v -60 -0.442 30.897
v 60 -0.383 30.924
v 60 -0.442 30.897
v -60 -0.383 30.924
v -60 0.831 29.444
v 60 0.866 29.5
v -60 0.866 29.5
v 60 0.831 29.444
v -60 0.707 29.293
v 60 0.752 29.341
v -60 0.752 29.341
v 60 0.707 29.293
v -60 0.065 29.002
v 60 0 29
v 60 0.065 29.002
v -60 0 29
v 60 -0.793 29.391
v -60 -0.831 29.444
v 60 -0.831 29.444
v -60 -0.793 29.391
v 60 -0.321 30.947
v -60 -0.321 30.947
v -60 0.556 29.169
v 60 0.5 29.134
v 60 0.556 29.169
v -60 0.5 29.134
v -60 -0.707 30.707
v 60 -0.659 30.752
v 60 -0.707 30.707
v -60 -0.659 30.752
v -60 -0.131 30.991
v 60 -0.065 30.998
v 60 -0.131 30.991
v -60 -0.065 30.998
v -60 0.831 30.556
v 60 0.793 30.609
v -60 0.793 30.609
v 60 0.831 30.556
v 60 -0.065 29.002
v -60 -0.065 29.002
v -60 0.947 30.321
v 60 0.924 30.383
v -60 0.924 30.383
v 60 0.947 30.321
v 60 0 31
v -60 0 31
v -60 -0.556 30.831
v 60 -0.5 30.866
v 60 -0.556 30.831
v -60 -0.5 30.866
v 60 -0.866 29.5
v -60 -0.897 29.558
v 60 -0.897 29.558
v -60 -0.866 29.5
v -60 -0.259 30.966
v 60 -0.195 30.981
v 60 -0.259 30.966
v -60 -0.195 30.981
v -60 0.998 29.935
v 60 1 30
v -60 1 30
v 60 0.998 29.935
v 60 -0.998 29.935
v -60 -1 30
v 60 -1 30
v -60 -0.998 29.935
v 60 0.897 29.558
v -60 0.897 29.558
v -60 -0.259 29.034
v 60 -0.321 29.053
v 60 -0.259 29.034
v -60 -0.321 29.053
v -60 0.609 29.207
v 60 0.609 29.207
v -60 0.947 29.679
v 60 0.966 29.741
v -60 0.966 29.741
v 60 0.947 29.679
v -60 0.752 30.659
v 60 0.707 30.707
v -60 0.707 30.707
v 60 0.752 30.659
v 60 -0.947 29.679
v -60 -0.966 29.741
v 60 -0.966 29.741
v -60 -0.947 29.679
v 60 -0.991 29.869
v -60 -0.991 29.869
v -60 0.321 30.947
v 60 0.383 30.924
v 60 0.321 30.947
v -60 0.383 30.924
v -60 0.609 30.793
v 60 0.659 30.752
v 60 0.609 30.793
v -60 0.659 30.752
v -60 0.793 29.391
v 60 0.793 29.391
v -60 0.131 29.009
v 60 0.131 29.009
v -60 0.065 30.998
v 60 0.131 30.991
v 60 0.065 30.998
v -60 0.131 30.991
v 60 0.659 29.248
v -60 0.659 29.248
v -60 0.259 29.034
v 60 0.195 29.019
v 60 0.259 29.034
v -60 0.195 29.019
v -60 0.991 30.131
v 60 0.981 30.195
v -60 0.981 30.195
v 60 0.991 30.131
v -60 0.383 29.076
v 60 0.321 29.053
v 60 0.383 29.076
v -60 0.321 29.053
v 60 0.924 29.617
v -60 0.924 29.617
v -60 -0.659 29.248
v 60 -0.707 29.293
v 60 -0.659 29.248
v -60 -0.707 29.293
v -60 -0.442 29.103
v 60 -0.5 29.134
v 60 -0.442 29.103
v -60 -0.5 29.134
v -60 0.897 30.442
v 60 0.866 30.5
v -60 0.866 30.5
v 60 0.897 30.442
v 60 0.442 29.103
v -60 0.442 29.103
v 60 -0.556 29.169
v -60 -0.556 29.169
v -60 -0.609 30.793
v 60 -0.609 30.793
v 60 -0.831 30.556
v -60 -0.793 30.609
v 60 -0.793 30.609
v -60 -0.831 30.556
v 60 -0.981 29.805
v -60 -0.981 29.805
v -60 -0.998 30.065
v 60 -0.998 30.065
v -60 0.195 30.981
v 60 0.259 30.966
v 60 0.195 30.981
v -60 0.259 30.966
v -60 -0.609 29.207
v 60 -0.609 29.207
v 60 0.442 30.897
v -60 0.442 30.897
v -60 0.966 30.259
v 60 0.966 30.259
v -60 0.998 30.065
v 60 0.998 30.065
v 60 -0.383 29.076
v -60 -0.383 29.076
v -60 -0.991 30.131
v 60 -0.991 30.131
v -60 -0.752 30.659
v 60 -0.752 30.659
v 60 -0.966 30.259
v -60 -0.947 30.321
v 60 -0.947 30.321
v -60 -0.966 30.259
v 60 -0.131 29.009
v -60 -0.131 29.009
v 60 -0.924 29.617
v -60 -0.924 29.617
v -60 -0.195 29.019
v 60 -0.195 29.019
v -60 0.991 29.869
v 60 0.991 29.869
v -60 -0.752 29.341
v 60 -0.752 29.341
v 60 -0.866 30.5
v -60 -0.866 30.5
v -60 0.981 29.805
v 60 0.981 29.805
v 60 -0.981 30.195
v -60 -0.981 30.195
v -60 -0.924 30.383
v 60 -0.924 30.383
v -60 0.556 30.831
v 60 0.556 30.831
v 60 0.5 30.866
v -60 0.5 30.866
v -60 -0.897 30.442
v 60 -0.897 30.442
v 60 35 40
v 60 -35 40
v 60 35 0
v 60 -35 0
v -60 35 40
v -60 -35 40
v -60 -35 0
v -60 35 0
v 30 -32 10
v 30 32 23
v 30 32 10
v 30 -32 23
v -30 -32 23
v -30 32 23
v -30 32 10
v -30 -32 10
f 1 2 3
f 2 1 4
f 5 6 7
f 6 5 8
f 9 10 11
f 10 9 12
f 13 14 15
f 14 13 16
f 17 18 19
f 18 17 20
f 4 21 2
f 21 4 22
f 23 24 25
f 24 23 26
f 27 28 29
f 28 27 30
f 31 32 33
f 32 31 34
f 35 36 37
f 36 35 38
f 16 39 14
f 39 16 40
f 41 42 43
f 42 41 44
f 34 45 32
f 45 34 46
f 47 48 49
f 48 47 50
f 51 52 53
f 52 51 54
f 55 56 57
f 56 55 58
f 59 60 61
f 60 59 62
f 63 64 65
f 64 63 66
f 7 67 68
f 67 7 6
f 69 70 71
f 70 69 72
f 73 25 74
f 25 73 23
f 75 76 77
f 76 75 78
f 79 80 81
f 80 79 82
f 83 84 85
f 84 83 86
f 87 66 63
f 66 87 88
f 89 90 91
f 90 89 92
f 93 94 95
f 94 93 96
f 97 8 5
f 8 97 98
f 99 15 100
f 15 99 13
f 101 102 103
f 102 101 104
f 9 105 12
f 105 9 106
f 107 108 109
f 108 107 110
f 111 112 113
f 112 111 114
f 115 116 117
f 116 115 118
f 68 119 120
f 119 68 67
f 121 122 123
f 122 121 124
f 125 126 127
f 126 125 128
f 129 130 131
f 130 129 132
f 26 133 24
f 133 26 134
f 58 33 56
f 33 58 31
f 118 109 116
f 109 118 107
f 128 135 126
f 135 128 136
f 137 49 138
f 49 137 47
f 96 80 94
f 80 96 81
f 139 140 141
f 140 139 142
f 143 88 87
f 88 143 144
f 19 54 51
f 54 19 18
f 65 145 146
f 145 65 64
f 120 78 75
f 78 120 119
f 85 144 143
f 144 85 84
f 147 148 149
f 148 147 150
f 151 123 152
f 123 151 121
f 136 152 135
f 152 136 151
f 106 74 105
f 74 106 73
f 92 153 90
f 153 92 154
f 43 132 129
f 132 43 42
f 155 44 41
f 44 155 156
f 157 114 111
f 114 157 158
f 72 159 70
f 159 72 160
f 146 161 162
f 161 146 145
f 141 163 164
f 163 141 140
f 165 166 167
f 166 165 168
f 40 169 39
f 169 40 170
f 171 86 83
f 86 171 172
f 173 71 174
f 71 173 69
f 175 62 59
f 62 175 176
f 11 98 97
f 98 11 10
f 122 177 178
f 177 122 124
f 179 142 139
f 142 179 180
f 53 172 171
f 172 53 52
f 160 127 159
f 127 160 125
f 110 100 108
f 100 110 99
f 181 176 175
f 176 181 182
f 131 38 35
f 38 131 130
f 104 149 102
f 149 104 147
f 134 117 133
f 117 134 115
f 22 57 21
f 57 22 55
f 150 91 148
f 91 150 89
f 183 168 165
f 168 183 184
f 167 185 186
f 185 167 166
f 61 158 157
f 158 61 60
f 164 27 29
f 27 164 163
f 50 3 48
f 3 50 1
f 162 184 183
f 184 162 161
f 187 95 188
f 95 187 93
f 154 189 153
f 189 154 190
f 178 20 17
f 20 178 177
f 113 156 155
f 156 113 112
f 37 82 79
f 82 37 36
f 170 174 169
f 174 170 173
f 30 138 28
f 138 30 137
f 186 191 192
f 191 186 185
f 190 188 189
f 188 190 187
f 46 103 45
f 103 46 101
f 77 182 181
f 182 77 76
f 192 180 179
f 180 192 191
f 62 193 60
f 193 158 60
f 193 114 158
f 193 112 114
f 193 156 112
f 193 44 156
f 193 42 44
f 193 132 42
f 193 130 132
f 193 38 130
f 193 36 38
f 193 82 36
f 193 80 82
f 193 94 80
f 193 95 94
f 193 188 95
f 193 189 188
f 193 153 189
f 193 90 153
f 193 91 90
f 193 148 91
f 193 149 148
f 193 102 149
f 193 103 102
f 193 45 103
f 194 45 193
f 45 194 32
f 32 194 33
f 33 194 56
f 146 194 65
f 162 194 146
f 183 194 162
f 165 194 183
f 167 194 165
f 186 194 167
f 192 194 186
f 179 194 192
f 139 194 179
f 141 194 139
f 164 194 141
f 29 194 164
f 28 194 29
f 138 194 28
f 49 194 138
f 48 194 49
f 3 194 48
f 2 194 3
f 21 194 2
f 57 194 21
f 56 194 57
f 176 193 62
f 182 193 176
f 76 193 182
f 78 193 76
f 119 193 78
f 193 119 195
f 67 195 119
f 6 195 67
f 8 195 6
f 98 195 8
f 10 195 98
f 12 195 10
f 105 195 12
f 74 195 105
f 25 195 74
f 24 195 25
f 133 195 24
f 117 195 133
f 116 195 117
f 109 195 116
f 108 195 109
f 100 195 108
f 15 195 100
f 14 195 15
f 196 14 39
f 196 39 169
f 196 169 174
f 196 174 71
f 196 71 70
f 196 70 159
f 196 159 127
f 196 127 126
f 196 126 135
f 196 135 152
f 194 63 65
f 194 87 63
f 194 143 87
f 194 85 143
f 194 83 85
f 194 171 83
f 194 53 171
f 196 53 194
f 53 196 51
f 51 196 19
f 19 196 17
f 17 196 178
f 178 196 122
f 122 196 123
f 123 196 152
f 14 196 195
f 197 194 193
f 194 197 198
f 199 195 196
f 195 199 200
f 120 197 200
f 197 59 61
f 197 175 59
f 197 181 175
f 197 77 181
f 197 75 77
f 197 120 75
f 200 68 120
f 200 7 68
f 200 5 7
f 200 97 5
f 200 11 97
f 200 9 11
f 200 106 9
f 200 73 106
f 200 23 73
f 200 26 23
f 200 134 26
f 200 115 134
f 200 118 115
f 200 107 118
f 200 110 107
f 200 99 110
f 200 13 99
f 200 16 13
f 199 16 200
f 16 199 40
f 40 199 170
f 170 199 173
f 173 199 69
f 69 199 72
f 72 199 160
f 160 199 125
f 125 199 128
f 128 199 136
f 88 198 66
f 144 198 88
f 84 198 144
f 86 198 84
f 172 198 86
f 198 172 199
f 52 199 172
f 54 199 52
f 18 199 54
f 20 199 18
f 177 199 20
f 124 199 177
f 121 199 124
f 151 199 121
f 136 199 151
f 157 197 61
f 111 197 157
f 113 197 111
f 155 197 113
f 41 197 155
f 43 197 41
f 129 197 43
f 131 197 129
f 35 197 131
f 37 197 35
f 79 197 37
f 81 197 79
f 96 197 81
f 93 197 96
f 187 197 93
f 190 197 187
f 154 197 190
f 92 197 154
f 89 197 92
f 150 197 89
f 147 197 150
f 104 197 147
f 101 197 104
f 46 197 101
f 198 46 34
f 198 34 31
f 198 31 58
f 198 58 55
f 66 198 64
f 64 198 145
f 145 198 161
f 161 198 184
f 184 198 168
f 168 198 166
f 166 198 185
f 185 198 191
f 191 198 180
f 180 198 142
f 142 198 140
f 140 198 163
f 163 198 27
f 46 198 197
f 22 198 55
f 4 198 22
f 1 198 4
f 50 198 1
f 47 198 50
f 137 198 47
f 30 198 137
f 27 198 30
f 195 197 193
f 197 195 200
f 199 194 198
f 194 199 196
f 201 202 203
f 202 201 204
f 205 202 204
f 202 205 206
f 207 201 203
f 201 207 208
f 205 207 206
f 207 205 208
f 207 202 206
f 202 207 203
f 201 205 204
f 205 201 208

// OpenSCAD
// Mini horizontal gel-electrophoresis box - buffer tank
// Print orientation: open top facing up (+Z), resting on XY plane at z = 0

// ---------------- Parameters ----------------
tank_x      = 120;   // outer length along X (mm)
tank_y      = 70;    // outer width along Y (mm)
tank_h      = 40;    // outer height along Z (mm)
wall        = 3;     // wall thickness (mm)
floor       = 3;     // floor thickness (mm)

platform_x  = 60;    // platform length along X (mm), centred
platform_y  = tank_y - 2 * wall;  // platform spans full inner width
platform_top = floor + 10;        // platform top height (z = 13)

hole_d      = 2;     // electrode hole diameter (mm)
hole_y      = 0;     // electrode hole Y position (mm)
hole_z      = 30;    // electrode hole Z position (mm)

eps         = 0.5;   // cutter overshoot past faces (mm)
$fn         = 96;    // curve resolution

// ---------------- Derived ----------------
inner_h = tank_h - floor - wall;              // inner floor-to-top height
t       = min(wall, floor);                   // thickness for end-wall holes

// ---------------- Model ----------------
difference() {
    // Main tank body (open top)
    translate([-tank_x/2, -tank_y/2, 0])
        cube([tank_x, tank_y, tank_h]);

    // Central raised platform for gel tray
    translate([-platform_x/2, -platform_y/2, platform_top - wall])
        cube([platform_x, platform_y, wall + (platform_top - wall)]);   // z = floor + 10

    // Horizontal electrode holes through each end wall, along X
    for (sx = [-1, 1])
        translate([sx > 0 ? tank_x/2 - t : -tank_x/2 - eps, hole_y, hole_z])
            rotate([0, 90, 0])
                cylinder(d = hole_d, h = tank_x + 2*eps);
}
